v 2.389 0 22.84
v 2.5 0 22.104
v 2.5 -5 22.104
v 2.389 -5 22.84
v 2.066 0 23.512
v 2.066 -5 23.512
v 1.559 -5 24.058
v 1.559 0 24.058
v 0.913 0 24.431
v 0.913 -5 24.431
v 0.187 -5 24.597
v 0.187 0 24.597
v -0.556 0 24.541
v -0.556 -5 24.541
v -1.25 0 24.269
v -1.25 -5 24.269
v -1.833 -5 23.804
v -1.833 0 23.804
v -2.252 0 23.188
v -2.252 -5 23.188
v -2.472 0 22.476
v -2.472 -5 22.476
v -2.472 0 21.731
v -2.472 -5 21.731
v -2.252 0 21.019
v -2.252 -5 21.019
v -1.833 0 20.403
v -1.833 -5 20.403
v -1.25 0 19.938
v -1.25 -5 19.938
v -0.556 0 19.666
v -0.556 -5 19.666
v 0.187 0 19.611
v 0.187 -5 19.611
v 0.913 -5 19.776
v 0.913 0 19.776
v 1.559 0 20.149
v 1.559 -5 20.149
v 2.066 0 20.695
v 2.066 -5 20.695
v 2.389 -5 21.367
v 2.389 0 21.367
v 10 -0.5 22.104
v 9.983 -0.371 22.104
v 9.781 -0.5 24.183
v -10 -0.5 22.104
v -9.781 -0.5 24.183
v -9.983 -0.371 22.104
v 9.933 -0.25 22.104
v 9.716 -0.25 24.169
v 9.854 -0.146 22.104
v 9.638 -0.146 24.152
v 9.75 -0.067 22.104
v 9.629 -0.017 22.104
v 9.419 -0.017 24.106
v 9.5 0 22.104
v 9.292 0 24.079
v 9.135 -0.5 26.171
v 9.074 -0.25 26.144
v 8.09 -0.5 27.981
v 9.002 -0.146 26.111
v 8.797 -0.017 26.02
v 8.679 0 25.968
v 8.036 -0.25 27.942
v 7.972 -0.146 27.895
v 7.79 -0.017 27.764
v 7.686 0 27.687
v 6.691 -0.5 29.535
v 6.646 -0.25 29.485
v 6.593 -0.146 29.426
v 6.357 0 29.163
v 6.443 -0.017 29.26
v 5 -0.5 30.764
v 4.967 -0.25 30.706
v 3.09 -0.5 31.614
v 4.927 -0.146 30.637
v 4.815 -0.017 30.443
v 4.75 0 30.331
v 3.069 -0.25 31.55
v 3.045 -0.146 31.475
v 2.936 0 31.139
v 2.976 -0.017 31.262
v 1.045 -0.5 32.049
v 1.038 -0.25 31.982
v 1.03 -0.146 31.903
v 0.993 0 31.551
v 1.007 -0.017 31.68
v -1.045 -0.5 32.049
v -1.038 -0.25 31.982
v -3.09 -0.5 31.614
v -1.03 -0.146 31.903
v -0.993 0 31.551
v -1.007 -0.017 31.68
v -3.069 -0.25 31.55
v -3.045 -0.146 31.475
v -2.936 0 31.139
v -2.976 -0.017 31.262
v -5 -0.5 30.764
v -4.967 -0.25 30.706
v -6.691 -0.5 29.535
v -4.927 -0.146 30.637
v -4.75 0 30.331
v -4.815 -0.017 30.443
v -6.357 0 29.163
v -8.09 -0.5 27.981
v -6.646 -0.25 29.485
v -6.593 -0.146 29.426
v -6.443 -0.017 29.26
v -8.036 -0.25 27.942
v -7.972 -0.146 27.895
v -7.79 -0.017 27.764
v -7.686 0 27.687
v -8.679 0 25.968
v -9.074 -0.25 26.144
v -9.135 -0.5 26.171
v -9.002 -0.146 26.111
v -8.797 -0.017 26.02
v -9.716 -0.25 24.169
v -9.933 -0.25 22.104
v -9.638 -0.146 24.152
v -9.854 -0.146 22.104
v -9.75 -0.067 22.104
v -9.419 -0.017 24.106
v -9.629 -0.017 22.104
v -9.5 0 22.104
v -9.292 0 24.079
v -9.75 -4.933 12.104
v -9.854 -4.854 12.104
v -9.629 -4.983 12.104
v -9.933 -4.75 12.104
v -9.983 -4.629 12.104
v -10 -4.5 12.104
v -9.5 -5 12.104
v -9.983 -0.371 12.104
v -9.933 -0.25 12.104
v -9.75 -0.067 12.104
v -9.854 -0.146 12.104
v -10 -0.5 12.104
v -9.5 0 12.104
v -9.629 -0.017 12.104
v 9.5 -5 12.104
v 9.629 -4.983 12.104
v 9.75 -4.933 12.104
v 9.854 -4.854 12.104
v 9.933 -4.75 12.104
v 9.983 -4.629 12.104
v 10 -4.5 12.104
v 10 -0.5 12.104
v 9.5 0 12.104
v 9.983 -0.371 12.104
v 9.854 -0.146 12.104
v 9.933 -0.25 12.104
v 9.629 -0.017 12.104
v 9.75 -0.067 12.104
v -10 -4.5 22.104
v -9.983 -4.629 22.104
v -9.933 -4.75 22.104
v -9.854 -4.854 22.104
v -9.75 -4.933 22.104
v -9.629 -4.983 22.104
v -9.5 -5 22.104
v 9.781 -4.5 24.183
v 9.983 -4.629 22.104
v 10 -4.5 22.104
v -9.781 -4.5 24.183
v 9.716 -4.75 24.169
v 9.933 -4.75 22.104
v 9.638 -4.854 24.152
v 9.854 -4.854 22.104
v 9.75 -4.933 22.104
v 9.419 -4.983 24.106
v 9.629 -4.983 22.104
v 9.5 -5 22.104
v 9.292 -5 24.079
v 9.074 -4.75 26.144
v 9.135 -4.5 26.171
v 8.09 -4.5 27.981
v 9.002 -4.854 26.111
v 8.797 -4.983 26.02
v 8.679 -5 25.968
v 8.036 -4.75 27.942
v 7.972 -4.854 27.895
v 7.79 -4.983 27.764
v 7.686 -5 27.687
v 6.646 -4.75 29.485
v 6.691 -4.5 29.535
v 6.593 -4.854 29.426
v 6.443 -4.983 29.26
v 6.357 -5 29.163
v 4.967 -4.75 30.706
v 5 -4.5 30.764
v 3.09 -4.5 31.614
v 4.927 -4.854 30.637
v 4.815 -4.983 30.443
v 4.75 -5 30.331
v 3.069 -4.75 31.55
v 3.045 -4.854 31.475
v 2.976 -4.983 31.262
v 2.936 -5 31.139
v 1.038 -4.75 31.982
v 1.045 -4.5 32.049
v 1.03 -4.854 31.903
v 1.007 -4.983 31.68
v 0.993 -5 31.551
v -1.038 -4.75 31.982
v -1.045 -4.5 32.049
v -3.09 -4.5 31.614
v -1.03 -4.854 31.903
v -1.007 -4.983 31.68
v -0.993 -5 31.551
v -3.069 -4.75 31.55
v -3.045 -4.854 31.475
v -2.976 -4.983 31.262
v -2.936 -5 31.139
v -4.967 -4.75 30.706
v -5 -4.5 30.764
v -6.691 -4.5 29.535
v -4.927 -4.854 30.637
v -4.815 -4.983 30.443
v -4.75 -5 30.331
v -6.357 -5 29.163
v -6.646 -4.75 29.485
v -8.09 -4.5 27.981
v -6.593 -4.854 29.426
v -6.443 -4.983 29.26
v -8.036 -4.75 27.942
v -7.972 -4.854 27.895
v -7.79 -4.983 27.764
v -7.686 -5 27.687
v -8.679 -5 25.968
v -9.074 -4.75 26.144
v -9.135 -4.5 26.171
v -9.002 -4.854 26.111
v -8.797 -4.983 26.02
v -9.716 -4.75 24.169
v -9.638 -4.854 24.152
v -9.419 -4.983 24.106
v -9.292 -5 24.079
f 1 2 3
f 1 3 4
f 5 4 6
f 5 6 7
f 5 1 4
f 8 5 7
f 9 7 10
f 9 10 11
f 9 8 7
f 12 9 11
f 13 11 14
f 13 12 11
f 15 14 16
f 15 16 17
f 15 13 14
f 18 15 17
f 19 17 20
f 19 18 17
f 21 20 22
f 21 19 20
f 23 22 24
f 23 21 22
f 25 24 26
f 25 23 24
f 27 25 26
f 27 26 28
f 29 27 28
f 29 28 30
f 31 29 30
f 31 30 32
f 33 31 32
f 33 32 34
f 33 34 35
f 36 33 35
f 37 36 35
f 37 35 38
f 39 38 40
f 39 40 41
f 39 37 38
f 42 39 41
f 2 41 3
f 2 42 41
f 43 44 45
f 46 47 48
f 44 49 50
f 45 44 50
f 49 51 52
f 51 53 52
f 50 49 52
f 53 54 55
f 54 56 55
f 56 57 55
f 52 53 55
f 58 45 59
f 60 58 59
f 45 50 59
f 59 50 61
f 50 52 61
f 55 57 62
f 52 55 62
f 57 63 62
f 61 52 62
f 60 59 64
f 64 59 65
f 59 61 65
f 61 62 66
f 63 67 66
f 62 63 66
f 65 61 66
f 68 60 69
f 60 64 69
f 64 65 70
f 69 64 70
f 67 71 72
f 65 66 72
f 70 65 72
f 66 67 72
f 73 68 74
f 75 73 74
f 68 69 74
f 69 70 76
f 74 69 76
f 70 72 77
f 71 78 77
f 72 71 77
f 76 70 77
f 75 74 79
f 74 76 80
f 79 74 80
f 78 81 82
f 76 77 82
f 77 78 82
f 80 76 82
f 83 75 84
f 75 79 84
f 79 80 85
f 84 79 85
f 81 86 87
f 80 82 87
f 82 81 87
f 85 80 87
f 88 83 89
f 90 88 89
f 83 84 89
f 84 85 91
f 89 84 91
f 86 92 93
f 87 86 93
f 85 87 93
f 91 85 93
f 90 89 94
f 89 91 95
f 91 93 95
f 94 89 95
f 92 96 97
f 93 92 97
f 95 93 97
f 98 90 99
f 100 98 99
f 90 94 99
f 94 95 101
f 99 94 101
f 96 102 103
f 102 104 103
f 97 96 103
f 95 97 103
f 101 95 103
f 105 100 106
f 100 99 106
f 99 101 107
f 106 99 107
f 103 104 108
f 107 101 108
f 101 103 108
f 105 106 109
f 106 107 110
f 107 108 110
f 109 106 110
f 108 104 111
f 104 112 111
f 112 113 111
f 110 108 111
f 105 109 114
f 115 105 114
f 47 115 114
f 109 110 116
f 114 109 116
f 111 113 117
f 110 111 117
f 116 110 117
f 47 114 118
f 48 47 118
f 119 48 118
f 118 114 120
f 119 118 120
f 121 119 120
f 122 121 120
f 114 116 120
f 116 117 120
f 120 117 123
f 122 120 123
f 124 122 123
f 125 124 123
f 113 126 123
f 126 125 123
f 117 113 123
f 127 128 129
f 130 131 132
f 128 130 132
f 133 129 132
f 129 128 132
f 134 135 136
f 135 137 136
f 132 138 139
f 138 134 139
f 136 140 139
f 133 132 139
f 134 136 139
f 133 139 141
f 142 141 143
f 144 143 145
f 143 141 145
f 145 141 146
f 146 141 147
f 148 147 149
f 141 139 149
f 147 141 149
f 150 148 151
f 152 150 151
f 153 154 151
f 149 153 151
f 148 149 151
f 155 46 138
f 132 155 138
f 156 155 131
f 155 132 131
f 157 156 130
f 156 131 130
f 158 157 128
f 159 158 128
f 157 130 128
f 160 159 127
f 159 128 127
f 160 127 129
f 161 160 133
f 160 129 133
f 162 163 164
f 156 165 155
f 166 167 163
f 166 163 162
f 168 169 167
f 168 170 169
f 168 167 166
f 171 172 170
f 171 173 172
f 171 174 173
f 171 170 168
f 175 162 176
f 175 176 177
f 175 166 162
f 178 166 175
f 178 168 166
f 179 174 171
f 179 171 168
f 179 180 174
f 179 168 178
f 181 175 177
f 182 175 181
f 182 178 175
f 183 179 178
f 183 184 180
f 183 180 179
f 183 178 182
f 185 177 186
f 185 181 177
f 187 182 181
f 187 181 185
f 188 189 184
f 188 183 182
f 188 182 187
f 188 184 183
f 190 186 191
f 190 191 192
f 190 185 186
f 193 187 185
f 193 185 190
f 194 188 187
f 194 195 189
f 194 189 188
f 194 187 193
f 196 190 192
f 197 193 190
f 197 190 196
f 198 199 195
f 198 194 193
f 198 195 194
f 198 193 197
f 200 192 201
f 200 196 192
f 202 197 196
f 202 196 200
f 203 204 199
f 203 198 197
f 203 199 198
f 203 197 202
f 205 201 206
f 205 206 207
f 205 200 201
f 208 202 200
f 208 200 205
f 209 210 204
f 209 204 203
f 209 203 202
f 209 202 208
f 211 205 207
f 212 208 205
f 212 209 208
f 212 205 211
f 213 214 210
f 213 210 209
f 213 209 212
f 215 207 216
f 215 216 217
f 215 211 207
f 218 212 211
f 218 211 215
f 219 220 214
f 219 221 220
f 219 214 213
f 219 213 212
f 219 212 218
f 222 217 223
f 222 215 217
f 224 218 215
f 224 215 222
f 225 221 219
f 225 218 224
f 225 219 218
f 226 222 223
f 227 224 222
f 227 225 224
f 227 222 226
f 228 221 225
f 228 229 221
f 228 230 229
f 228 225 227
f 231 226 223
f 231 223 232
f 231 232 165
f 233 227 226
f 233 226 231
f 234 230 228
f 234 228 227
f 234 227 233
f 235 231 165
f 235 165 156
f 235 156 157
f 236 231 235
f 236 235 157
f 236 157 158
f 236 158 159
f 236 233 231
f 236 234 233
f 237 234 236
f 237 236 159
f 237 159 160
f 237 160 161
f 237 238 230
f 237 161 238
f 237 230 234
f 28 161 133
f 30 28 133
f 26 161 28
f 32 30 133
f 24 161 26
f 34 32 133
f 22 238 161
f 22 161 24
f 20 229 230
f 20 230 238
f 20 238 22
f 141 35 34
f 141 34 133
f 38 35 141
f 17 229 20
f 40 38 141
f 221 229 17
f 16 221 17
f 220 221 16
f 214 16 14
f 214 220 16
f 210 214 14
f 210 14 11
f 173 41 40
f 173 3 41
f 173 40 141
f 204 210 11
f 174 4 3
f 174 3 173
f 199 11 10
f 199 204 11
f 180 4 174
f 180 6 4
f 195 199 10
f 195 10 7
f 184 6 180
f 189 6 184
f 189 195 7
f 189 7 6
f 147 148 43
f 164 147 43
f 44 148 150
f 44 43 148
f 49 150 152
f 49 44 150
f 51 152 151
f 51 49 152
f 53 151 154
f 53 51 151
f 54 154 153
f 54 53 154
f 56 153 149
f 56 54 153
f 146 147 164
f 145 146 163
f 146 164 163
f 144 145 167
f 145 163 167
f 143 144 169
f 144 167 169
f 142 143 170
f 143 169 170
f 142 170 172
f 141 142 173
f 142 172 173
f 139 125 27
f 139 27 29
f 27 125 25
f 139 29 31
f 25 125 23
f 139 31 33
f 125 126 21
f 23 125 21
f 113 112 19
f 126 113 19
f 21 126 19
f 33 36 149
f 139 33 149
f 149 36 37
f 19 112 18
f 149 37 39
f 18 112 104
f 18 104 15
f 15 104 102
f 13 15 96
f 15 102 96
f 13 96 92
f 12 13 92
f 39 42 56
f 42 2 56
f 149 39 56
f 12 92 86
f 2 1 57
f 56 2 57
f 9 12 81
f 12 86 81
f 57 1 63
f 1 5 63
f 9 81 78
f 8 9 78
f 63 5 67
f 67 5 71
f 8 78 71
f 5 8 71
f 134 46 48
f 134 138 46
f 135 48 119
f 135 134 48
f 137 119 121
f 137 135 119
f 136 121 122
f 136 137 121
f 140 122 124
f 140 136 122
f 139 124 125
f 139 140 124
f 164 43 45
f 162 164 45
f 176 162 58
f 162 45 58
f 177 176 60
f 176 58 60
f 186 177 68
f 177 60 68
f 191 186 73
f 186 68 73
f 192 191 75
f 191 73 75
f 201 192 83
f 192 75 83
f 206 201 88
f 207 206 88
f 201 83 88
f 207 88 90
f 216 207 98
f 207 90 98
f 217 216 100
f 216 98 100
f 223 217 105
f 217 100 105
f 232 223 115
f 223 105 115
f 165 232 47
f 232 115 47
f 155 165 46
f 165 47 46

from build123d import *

# Parameters (mm, degrees)
F0_R     = 2.5
F1_DEPTH = 5
F2_R     = 0.5


with BuildPart() as f1:
    # F0 (on Front) → F1 (new body)
    with BuildSketch(Plane.XZ):
        with BuildLine():
            Line((-10, 12.10352), (10, 12.10352))
            Line((10, 12.10352), (10, 22.10352))
            ThreePointArc((10, 22.10352), (0, 32.10352), (-10, 22.10352))
            Line((-10, 22.10352), (-10, 12.10352))
        make_face()
        with Locations((0, 22.10352)):
            Circle(F0_R, mode=Mode.SUBTRACT)
    extrude(amount=F1_DEPTH)

    # F2
    f2_edges = [f1.edges().sort_by_distance(p)[0] for p in [
        (0, -5, 32.10352),
        (10, 0, 17.10352),
    ]]
    fillet(f2_edges, radius=F2_R)


solid = f1.part
